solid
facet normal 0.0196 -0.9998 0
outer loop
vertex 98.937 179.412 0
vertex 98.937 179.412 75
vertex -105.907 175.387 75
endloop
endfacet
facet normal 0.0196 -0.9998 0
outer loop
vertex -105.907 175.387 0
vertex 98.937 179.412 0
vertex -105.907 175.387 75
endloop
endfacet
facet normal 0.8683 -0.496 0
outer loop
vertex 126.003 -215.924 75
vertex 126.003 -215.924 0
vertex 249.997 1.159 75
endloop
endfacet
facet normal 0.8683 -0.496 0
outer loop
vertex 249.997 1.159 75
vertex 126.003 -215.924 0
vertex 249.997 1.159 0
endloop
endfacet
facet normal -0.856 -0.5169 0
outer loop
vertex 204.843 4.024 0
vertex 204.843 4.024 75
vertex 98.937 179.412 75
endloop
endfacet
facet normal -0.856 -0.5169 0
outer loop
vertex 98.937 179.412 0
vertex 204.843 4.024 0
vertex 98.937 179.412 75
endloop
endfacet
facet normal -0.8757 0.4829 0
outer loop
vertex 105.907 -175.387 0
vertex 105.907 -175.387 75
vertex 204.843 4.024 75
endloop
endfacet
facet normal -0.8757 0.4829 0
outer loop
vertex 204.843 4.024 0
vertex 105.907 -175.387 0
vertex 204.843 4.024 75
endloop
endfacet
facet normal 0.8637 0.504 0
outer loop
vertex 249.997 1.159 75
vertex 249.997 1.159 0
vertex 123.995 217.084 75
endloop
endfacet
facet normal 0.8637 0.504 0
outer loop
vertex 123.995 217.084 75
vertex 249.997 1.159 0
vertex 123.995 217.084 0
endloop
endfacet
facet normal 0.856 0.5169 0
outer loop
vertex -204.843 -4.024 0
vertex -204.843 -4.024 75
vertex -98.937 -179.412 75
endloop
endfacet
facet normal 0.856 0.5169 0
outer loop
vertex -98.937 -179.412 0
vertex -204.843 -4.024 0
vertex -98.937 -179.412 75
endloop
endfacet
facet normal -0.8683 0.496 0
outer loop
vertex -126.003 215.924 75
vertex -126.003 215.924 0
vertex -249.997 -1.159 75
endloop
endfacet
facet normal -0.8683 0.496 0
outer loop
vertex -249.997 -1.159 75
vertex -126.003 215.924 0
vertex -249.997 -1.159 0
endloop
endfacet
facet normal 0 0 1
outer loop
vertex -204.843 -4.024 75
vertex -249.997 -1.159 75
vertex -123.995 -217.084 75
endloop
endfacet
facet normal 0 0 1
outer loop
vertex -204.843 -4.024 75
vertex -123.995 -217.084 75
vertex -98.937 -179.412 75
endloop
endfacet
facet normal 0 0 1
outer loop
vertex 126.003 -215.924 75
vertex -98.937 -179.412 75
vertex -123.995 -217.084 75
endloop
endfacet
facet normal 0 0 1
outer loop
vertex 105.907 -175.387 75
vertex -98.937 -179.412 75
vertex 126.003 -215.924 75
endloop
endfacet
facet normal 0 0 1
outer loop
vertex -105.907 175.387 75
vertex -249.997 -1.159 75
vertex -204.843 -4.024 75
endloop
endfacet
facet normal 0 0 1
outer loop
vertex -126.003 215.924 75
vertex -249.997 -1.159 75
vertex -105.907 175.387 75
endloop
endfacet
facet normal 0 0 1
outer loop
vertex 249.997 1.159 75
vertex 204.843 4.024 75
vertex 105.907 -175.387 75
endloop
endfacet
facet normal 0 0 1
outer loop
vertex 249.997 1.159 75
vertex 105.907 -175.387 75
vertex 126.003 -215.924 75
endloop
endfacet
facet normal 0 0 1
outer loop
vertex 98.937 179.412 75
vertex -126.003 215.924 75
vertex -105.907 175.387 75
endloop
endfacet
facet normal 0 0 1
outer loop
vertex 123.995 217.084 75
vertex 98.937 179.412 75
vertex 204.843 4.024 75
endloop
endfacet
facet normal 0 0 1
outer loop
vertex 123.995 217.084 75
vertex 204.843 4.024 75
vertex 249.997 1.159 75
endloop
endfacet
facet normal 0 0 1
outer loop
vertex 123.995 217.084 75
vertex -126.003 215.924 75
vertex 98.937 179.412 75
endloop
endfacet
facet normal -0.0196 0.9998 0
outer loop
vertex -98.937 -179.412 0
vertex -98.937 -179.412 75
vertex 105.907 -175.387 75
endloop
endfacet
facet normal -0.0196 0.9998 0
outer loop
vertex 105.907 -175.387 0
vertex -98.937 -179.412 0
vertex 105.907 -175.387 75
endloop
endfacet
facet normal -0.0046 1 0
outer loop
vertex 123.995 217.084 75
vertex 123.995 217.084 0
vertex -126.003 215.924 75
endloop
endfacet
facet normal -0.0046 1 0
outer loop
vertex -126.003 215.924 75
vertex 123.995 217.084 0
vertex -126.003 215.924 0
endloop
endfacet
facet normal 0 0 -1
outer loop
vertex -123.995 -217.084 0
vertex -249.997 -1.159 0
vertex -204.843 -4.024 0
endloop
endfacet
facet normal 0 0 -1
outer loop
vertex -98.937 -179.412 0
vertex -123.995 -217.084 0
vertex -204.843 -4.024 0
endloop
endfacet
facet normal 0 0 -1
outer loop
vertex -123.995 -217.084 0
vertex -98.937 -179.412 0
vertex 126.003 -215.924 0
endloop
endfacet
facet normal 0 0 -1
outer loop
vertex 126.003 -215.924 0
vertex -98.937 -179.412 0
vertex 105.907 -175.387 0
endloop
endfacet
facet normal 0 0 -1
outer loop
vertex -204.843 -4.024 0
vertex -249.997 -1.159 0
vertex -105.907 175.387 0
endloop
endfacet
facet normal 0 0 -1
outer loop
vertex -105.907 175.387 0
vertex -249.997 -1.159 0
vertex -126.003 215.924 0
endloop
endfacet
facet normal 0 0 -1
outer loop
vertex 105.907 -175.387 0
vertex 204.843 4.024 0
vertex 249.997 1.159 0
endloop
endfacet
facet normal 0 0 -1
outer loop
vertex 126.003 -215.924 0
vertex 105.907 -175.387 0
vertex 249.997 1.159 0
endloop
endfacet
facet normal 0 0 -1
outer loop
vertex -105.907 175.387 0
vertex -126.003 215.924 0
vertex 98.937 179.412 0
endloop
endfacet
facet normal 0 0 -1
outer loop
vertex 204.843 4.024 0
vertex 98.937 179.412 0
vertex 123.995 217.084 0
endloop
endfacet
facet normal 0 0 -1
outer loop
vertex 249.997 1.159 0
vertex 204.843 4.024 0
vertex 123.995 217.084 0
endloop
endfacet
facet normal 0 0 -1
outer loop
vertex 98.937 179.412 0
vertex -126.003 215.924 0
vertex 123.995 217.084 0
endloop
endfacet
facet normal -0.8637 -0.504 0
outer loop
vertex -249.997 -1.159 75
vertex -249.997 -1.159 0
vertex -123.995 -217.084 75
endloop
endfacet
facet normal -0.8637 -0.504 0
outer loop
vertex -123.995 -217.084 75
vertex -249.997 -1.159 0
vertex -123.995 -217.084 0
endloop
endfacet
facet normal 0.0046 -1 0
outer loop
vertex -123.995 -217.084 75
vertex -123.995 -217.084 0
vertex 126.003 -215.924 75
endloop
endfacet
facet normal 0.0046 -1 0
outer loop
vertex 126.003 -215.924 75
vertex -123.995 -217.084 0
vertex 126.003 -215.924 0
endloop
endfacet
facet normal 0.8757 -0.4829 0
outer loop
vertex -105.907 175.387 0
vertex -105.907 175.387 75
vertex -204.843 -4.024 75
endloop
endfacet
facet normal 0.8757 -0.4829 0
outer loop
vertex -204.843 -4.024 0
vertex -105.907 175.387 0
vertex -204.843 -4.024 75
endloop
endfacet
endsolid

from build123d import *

# Parameters (mm, degrees)
F1_DEPTH = 75
F3_DEPTH = 24.7
F4_DEPTH = 15.24
F5_DEPTH = 75


with BuildPart() as f1:
    # F0 (on Top) → F1 (new body)
    with BuildSketch(Plane.XY):
        Polygon((-126.0027056111, 215.9243343829), (-249.9973116764, -1.1593768134), (-123.9946060653, -217.0837111962), (126.0027056111, -215.9243343829), (249.9973116764, 1.1593768134), (123.9946060653, 217.0837111962), align=None)
    extrude(amount=F1_DEPTH)

    # F2 (on face) → F3 (cut)
    with BuildSketch(Plane.XY.offset(75)):
        Polygon((-105.9065815033, 175.3874490276), (-204.8432771145, -4.024065496), (-98.9366956112, -179.4115145236), (105.9065815033, -175.3874490276), (204.8432771145, 4.024065496), (98.9366956112, 179.4115145236), align=None)
    extrude(amount=-F3_DEPTH, mode=Mode.SUBTRACT)

    # F4 (cut): a face of the model
    f4_faces = [f1.faces().sort_by_distance(p)[0] for p in [
        (0, 0, 50.3),
    ]]
    extrude(f4_faces, amount=-F4_DEPTH, mode=Mode.SUBTRACT)

    # F5 (cut): a face of the model
    f5_faces = [f1.faces().sort_by_distance(p)[0] for p in [
        (0, 0, 35.06),
    ]]
    extrude(f5_faces, amount=-F5_DEPTH, mode=Mode.SUBTRACT)


solid = f1.part
